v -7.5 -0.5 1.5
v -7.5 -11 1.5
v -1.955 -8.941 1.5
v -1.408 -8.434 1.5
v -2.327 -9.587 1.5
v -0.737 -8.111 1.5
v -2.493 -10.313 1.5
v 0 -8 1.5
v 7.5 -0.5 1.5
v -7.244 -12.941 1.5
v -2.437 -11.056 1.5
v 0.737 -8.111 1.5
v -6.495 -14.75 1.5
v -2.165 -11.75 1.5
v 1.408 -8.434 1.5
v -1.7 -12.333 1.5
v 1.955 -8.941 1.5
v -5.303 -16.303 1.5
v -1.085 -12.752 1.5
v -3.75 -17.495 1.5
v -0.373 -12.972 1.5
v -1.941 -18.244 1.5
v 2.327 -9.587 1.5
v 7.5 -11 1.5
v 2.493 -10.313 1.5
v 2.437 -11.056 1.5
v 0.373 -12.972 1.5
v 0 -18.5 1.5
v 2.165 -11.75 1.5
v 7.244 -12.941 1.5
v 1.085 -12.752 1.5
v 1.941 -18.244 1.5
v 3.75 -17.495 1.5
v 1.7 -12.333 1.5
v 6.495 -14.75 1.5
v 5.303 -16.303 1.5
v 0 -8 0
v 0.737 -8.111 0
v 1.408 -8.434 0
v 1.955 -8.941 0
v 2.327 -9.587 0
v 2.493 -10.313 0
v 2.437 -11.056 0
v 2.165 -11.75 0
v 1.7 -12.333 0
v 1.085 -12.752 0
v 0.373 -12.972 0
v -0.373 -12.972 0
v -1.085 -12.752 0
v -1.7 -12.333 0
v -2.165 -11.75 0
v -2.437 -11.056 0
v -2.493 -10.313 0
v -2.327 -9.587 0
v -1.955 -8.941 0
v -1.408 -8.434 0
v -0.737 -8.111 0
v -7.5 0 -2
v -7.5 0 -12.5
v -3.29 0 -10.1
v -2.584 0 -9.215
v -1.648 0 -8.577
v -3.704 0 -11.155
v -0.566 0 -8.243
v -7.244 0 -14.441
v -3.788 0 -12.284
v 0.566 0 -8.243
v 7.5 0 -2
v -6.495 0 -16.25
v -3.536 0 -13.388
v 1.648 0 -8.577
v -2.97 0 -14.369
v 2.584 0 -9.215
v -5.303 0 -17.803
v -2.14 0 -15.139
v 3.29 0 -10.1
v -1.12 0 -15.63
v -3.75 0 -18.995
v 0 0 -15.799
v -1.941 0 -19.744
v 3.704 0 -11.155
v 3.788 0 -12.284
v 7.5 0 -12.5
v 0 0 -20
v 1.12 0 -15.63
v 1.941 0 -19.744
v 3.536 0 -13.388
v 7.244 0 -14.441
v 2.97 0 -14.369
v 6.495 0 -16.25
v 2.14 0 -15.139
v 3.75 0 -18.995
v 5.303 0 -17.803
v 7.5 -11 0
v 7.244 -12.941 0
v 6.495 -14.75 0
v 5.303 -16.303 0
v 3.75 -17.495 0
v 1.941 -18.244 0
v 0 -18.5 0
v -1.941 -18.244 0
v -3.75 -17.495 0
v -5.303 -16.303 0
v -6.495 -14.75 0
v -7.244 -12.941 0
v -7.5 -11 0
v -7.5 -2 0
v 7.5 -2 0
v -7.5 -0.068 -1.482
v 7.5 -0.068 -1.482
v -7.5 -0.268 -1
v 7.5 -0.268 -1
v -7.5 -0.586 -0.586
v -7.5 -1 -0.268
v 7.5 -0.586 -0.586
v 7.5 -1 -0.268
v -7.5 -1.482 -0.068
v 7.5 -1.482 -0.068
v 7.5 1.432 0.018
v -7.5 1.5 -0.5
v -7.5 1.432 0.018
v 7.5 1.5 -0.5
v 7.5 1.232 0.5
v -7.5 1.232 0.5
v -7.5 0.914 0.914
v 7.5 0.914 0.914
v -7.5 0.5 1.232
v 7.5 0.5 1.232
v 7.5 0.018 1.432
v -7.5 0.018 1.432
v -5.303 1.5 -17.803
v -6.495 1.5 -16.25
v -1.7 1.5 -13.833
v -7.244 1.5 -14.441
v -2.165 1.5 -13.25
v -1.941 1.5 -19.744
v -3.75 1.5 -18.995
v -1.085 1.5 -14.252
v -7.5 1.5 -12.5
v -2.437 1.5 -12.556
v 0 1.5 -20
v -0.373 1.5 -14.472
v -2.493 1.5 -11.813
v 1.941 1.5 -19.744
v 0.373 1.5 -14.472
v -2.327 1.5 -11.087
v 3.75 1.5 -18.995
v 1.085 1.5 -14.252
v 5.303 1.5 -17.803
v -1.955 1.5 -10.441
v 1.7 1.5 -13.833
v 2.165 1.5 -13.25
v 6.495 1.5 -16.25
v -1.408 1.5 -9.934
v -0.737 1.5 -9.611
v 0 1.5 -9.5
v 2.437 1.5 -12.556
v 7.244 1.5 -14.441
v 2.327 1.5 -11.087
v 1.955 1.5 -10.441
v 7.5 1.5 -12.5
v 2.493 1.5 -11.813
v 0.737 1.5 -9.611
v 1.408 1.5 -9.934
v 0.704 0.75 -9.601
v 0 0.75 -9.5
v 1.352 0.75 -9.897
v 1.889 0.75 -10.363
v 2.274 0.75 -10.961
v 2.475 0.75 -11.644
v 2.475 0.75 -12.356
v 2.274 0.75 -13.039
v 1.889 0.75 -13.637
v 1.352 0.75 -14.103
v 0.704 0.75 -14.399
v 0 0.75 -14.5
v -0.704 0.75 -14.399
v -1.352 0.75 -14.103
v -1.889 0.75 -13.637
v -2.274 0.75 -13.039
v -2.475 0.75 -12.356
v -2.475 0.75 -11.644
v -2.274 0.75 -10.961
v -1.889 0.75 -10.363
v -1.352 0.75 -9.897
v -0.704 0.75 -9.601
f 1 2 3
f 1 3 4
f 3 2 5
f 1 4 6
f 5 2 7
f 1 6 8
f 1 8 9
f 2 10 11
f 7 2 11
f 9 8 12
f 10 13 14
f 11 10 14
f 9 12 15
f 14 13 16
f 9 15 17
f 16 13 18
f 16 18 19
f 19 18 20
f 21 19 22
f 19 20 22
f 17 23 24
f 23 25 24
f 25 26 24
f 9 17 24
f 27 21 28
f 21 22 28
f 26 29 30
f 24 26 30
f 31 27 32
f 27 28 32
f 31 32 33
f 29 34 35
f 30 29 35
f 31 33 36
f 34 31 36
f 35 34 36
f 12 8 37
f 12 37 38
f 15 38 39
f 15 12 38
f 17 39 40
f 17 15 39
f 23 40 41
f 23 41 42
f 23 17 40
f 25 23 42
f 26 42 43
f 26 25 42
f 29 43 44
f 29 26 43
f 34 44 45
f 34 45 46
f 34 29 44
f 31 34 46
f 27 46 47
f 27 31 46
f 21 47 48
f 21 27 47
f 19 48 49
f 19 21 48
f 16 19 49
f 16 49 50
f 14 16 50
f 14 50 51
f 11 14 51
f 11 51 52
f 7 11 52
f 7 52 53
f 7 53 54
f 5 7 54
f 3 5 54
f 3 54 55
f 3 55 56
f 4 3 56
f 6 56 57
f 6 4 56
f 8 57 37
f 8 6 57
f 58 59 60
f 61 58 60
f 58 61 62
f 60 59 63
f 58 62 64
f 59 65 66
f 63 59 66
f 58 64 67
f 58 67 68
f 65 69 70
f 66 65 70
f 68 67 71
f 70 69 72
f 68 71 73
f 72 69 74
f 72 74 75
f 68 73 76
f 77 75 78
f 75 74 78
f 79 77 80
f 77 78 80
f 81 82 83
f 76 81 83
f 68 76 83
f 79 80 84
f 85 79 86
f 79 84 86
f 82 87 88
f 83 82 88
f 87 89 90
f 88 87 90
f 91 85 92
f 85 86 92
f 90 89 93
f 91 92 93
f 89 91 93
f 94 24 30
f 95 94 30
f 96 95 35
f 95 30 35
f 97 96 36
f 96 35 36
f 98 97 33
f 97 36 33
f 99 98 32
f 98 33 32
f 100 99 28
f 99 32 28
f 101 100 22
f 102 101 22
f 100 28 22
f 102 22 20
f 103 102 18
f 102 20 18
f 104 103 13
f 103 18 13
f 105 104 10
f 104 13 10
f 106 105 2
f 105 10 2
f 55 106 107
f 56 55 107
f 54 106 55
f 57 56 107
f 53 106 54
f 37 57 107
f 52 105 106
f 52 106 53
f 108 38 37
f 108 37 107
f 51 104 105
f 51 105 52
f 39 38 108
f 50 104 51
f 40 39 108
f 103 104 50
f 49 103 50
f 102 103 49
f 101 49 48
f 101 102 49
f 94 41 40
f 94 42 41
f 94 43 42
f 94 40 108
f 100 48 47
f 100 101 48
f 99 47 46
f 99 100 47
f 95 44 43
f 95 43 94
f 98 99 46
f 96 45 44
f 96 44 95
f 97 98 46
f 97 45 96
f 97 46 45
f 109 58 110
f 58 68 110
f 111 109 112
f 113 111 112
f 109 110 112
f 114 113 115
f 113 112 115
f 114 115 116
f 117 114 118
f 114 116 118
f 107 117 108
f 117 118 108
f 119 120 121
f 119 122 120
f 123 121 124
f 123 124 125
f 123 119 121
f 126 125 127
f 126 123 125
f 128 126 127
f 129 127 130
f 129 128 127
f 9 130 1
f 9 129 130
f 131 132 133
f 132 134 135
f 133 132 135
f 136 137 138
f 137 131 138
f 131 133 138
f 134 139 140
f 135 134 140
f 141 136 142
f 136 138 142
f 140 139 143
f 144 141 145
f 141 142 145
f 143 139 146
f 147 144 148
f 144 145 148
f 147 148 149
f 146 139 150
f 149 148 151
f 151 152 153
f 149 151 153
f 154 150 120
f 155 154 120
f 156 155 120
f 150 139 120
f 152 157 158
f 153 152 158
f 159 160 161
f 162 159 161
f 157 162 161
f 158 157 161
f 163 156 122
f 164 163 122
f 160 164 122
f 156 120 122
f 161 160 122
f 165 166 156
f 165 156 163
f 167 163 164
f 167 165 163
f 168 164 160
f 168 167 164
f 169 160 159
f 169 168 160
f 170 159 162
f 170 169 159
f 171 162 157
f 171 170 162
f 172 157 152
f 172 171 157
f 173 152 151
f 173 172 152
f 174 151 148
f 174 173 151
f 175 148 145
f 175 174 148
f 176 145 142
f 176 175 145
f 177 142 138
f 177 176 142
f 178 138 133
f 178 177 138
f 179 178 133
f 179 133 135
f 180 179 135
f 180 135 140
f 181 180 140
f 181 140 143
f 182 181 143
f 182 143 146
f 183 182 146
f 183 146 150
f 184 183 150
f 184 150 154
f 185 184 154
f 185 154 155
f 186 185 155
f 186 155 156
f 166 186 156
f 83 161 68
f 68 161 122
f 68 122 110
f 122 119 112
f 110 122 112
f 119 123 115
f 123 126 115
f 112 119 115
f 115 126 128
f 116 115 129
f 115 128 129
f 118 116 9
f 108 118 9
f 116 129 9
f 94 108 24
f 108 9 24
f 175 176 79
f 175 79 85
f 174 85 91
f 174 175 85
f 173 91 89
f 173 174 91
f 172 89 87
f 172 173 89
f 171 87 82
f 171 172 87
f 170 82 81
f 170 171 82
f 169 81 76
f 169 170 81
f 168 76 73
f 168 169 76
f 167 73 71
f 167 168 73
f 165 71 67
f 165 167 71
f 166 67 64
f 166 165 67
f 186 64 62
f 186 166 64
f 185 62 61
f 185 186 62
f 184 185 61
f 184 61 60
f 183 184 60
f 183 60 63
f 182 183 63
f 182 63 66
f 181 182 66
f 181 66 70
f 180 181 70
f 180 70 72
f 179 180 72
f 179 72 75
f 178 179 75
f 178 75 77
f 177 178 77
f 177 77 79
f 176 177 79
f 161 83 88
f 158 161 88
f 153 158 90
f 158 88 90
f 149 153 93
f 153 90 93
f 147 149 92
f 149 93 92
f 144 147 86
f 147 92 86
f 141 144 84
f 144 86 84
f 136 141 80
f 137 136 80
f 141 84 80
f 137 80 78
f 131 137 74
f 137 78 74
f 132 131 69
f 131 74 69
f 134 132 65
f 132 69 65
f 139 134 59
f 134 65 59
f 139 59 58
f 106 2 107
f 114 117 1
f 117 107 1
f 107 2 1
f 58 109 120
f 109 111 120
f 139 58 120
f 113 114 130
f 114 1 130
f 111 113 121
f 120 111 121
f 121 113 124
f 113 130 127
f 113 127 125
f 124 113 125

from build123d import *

# Parameters (mm, degrees)
SKETCH1_R           = 2.5
BOSS_EXTRUDE1_DEPTH = 1.5
CIRPATTERN1_COUNT   = 2
CIRPATTERN1_ANGLE   = 90
FILLET1_R           = 2
SKETCH3_R           = 2.5
CUT_EXTRUDE2_DEPTH  = 0.75
CUT_EXTRUDE2_DRAFT  = -60


with BuildPart() as part:
    # Sketch1 → Boss-Extrude1 (new body)
    with BuildSketch(Plane(origin=(0, 0, 0), x_dir=(1, 0, 0), z_dir=(0, 1, 0))):
        with BuildLine():
            Line((-7.5, 0), (7.5, 0))
            Line((7.5, 0), (7.5, 12.5))
            ThreePointArc((7.5, 12.5), (0, 20), (-7.5, 12.5))
            Line((-7.5, 12.5), (-7.5, 0))
        make_face()
        with Locations(Location((0, 12, 0), (0, 0, 270))):
            Circle(SKETCH1_R, mode=Mode.SUBTRACT)
    boss_extrude1 = extrude(amount=BOSS_EXTRUDE1_DEPTH)

    # CirPattern1: Boss-Extrude1 ×2 about axis
    cirpattern1_axis = Axis((-7.5, 1.5, 0), (-1, 0, 0))
    for i in range(1, CIRPATTERN1_COUNT):
        add(boss_extrude1.rotate(cirpattern1_axis, i * CIRPATTERN1_ANGLE / (CIRPATTERN1_COUNT - 1)))

    # Fillet1
    fillet1_edges = [part.edges().sort_by_distance(p)[0] for p in [
        (0, 1.5, 1.5),
        (0, 0, 0),
    ]]
    fillet(fillet1_edges, radius=FILLET1_R)


with BuildPart() as cut_extrude2_tool:
    # Sketch3 → Cut-Extrude2 (with draft: the straight prism first)
    with BuildSketch(Plane(origin=(0, 0.75, 0), x_dir=(-1, 0, 0), z_dir=(0, -1, 0))):
        with Locations(Location((0, 12, 0), (0, 0, 90))):
            Circle(SKETCH3_R)
    extrude(amount=CUT_EXTRUDE2_DEPTH)
    # Cut-Extrude2: the draft: its side faces are tilted about the plane it starts from
    cut_extrude2_sides = [cut_extrude2_tool.faces().sort_by_distance(p)[0] for p in [
        (0, 0.375, -9.5),
    ]]
    draft(cut_extrude2_sides, Plane(origin=(0, 0.75, 0), x_dir=(-1, 0, 0), z_dir=(0, -1, 0)), CUT_EXTRUDE2_DRAFT)


with BuildPart() as part_1:
    add(part.part)

    # Cut-Extrude2: cut by cut_extrude2_tool
    add(cut_extrude2_tool.part, mode=Mode.SUBTRACT)


solid = part_1.part
